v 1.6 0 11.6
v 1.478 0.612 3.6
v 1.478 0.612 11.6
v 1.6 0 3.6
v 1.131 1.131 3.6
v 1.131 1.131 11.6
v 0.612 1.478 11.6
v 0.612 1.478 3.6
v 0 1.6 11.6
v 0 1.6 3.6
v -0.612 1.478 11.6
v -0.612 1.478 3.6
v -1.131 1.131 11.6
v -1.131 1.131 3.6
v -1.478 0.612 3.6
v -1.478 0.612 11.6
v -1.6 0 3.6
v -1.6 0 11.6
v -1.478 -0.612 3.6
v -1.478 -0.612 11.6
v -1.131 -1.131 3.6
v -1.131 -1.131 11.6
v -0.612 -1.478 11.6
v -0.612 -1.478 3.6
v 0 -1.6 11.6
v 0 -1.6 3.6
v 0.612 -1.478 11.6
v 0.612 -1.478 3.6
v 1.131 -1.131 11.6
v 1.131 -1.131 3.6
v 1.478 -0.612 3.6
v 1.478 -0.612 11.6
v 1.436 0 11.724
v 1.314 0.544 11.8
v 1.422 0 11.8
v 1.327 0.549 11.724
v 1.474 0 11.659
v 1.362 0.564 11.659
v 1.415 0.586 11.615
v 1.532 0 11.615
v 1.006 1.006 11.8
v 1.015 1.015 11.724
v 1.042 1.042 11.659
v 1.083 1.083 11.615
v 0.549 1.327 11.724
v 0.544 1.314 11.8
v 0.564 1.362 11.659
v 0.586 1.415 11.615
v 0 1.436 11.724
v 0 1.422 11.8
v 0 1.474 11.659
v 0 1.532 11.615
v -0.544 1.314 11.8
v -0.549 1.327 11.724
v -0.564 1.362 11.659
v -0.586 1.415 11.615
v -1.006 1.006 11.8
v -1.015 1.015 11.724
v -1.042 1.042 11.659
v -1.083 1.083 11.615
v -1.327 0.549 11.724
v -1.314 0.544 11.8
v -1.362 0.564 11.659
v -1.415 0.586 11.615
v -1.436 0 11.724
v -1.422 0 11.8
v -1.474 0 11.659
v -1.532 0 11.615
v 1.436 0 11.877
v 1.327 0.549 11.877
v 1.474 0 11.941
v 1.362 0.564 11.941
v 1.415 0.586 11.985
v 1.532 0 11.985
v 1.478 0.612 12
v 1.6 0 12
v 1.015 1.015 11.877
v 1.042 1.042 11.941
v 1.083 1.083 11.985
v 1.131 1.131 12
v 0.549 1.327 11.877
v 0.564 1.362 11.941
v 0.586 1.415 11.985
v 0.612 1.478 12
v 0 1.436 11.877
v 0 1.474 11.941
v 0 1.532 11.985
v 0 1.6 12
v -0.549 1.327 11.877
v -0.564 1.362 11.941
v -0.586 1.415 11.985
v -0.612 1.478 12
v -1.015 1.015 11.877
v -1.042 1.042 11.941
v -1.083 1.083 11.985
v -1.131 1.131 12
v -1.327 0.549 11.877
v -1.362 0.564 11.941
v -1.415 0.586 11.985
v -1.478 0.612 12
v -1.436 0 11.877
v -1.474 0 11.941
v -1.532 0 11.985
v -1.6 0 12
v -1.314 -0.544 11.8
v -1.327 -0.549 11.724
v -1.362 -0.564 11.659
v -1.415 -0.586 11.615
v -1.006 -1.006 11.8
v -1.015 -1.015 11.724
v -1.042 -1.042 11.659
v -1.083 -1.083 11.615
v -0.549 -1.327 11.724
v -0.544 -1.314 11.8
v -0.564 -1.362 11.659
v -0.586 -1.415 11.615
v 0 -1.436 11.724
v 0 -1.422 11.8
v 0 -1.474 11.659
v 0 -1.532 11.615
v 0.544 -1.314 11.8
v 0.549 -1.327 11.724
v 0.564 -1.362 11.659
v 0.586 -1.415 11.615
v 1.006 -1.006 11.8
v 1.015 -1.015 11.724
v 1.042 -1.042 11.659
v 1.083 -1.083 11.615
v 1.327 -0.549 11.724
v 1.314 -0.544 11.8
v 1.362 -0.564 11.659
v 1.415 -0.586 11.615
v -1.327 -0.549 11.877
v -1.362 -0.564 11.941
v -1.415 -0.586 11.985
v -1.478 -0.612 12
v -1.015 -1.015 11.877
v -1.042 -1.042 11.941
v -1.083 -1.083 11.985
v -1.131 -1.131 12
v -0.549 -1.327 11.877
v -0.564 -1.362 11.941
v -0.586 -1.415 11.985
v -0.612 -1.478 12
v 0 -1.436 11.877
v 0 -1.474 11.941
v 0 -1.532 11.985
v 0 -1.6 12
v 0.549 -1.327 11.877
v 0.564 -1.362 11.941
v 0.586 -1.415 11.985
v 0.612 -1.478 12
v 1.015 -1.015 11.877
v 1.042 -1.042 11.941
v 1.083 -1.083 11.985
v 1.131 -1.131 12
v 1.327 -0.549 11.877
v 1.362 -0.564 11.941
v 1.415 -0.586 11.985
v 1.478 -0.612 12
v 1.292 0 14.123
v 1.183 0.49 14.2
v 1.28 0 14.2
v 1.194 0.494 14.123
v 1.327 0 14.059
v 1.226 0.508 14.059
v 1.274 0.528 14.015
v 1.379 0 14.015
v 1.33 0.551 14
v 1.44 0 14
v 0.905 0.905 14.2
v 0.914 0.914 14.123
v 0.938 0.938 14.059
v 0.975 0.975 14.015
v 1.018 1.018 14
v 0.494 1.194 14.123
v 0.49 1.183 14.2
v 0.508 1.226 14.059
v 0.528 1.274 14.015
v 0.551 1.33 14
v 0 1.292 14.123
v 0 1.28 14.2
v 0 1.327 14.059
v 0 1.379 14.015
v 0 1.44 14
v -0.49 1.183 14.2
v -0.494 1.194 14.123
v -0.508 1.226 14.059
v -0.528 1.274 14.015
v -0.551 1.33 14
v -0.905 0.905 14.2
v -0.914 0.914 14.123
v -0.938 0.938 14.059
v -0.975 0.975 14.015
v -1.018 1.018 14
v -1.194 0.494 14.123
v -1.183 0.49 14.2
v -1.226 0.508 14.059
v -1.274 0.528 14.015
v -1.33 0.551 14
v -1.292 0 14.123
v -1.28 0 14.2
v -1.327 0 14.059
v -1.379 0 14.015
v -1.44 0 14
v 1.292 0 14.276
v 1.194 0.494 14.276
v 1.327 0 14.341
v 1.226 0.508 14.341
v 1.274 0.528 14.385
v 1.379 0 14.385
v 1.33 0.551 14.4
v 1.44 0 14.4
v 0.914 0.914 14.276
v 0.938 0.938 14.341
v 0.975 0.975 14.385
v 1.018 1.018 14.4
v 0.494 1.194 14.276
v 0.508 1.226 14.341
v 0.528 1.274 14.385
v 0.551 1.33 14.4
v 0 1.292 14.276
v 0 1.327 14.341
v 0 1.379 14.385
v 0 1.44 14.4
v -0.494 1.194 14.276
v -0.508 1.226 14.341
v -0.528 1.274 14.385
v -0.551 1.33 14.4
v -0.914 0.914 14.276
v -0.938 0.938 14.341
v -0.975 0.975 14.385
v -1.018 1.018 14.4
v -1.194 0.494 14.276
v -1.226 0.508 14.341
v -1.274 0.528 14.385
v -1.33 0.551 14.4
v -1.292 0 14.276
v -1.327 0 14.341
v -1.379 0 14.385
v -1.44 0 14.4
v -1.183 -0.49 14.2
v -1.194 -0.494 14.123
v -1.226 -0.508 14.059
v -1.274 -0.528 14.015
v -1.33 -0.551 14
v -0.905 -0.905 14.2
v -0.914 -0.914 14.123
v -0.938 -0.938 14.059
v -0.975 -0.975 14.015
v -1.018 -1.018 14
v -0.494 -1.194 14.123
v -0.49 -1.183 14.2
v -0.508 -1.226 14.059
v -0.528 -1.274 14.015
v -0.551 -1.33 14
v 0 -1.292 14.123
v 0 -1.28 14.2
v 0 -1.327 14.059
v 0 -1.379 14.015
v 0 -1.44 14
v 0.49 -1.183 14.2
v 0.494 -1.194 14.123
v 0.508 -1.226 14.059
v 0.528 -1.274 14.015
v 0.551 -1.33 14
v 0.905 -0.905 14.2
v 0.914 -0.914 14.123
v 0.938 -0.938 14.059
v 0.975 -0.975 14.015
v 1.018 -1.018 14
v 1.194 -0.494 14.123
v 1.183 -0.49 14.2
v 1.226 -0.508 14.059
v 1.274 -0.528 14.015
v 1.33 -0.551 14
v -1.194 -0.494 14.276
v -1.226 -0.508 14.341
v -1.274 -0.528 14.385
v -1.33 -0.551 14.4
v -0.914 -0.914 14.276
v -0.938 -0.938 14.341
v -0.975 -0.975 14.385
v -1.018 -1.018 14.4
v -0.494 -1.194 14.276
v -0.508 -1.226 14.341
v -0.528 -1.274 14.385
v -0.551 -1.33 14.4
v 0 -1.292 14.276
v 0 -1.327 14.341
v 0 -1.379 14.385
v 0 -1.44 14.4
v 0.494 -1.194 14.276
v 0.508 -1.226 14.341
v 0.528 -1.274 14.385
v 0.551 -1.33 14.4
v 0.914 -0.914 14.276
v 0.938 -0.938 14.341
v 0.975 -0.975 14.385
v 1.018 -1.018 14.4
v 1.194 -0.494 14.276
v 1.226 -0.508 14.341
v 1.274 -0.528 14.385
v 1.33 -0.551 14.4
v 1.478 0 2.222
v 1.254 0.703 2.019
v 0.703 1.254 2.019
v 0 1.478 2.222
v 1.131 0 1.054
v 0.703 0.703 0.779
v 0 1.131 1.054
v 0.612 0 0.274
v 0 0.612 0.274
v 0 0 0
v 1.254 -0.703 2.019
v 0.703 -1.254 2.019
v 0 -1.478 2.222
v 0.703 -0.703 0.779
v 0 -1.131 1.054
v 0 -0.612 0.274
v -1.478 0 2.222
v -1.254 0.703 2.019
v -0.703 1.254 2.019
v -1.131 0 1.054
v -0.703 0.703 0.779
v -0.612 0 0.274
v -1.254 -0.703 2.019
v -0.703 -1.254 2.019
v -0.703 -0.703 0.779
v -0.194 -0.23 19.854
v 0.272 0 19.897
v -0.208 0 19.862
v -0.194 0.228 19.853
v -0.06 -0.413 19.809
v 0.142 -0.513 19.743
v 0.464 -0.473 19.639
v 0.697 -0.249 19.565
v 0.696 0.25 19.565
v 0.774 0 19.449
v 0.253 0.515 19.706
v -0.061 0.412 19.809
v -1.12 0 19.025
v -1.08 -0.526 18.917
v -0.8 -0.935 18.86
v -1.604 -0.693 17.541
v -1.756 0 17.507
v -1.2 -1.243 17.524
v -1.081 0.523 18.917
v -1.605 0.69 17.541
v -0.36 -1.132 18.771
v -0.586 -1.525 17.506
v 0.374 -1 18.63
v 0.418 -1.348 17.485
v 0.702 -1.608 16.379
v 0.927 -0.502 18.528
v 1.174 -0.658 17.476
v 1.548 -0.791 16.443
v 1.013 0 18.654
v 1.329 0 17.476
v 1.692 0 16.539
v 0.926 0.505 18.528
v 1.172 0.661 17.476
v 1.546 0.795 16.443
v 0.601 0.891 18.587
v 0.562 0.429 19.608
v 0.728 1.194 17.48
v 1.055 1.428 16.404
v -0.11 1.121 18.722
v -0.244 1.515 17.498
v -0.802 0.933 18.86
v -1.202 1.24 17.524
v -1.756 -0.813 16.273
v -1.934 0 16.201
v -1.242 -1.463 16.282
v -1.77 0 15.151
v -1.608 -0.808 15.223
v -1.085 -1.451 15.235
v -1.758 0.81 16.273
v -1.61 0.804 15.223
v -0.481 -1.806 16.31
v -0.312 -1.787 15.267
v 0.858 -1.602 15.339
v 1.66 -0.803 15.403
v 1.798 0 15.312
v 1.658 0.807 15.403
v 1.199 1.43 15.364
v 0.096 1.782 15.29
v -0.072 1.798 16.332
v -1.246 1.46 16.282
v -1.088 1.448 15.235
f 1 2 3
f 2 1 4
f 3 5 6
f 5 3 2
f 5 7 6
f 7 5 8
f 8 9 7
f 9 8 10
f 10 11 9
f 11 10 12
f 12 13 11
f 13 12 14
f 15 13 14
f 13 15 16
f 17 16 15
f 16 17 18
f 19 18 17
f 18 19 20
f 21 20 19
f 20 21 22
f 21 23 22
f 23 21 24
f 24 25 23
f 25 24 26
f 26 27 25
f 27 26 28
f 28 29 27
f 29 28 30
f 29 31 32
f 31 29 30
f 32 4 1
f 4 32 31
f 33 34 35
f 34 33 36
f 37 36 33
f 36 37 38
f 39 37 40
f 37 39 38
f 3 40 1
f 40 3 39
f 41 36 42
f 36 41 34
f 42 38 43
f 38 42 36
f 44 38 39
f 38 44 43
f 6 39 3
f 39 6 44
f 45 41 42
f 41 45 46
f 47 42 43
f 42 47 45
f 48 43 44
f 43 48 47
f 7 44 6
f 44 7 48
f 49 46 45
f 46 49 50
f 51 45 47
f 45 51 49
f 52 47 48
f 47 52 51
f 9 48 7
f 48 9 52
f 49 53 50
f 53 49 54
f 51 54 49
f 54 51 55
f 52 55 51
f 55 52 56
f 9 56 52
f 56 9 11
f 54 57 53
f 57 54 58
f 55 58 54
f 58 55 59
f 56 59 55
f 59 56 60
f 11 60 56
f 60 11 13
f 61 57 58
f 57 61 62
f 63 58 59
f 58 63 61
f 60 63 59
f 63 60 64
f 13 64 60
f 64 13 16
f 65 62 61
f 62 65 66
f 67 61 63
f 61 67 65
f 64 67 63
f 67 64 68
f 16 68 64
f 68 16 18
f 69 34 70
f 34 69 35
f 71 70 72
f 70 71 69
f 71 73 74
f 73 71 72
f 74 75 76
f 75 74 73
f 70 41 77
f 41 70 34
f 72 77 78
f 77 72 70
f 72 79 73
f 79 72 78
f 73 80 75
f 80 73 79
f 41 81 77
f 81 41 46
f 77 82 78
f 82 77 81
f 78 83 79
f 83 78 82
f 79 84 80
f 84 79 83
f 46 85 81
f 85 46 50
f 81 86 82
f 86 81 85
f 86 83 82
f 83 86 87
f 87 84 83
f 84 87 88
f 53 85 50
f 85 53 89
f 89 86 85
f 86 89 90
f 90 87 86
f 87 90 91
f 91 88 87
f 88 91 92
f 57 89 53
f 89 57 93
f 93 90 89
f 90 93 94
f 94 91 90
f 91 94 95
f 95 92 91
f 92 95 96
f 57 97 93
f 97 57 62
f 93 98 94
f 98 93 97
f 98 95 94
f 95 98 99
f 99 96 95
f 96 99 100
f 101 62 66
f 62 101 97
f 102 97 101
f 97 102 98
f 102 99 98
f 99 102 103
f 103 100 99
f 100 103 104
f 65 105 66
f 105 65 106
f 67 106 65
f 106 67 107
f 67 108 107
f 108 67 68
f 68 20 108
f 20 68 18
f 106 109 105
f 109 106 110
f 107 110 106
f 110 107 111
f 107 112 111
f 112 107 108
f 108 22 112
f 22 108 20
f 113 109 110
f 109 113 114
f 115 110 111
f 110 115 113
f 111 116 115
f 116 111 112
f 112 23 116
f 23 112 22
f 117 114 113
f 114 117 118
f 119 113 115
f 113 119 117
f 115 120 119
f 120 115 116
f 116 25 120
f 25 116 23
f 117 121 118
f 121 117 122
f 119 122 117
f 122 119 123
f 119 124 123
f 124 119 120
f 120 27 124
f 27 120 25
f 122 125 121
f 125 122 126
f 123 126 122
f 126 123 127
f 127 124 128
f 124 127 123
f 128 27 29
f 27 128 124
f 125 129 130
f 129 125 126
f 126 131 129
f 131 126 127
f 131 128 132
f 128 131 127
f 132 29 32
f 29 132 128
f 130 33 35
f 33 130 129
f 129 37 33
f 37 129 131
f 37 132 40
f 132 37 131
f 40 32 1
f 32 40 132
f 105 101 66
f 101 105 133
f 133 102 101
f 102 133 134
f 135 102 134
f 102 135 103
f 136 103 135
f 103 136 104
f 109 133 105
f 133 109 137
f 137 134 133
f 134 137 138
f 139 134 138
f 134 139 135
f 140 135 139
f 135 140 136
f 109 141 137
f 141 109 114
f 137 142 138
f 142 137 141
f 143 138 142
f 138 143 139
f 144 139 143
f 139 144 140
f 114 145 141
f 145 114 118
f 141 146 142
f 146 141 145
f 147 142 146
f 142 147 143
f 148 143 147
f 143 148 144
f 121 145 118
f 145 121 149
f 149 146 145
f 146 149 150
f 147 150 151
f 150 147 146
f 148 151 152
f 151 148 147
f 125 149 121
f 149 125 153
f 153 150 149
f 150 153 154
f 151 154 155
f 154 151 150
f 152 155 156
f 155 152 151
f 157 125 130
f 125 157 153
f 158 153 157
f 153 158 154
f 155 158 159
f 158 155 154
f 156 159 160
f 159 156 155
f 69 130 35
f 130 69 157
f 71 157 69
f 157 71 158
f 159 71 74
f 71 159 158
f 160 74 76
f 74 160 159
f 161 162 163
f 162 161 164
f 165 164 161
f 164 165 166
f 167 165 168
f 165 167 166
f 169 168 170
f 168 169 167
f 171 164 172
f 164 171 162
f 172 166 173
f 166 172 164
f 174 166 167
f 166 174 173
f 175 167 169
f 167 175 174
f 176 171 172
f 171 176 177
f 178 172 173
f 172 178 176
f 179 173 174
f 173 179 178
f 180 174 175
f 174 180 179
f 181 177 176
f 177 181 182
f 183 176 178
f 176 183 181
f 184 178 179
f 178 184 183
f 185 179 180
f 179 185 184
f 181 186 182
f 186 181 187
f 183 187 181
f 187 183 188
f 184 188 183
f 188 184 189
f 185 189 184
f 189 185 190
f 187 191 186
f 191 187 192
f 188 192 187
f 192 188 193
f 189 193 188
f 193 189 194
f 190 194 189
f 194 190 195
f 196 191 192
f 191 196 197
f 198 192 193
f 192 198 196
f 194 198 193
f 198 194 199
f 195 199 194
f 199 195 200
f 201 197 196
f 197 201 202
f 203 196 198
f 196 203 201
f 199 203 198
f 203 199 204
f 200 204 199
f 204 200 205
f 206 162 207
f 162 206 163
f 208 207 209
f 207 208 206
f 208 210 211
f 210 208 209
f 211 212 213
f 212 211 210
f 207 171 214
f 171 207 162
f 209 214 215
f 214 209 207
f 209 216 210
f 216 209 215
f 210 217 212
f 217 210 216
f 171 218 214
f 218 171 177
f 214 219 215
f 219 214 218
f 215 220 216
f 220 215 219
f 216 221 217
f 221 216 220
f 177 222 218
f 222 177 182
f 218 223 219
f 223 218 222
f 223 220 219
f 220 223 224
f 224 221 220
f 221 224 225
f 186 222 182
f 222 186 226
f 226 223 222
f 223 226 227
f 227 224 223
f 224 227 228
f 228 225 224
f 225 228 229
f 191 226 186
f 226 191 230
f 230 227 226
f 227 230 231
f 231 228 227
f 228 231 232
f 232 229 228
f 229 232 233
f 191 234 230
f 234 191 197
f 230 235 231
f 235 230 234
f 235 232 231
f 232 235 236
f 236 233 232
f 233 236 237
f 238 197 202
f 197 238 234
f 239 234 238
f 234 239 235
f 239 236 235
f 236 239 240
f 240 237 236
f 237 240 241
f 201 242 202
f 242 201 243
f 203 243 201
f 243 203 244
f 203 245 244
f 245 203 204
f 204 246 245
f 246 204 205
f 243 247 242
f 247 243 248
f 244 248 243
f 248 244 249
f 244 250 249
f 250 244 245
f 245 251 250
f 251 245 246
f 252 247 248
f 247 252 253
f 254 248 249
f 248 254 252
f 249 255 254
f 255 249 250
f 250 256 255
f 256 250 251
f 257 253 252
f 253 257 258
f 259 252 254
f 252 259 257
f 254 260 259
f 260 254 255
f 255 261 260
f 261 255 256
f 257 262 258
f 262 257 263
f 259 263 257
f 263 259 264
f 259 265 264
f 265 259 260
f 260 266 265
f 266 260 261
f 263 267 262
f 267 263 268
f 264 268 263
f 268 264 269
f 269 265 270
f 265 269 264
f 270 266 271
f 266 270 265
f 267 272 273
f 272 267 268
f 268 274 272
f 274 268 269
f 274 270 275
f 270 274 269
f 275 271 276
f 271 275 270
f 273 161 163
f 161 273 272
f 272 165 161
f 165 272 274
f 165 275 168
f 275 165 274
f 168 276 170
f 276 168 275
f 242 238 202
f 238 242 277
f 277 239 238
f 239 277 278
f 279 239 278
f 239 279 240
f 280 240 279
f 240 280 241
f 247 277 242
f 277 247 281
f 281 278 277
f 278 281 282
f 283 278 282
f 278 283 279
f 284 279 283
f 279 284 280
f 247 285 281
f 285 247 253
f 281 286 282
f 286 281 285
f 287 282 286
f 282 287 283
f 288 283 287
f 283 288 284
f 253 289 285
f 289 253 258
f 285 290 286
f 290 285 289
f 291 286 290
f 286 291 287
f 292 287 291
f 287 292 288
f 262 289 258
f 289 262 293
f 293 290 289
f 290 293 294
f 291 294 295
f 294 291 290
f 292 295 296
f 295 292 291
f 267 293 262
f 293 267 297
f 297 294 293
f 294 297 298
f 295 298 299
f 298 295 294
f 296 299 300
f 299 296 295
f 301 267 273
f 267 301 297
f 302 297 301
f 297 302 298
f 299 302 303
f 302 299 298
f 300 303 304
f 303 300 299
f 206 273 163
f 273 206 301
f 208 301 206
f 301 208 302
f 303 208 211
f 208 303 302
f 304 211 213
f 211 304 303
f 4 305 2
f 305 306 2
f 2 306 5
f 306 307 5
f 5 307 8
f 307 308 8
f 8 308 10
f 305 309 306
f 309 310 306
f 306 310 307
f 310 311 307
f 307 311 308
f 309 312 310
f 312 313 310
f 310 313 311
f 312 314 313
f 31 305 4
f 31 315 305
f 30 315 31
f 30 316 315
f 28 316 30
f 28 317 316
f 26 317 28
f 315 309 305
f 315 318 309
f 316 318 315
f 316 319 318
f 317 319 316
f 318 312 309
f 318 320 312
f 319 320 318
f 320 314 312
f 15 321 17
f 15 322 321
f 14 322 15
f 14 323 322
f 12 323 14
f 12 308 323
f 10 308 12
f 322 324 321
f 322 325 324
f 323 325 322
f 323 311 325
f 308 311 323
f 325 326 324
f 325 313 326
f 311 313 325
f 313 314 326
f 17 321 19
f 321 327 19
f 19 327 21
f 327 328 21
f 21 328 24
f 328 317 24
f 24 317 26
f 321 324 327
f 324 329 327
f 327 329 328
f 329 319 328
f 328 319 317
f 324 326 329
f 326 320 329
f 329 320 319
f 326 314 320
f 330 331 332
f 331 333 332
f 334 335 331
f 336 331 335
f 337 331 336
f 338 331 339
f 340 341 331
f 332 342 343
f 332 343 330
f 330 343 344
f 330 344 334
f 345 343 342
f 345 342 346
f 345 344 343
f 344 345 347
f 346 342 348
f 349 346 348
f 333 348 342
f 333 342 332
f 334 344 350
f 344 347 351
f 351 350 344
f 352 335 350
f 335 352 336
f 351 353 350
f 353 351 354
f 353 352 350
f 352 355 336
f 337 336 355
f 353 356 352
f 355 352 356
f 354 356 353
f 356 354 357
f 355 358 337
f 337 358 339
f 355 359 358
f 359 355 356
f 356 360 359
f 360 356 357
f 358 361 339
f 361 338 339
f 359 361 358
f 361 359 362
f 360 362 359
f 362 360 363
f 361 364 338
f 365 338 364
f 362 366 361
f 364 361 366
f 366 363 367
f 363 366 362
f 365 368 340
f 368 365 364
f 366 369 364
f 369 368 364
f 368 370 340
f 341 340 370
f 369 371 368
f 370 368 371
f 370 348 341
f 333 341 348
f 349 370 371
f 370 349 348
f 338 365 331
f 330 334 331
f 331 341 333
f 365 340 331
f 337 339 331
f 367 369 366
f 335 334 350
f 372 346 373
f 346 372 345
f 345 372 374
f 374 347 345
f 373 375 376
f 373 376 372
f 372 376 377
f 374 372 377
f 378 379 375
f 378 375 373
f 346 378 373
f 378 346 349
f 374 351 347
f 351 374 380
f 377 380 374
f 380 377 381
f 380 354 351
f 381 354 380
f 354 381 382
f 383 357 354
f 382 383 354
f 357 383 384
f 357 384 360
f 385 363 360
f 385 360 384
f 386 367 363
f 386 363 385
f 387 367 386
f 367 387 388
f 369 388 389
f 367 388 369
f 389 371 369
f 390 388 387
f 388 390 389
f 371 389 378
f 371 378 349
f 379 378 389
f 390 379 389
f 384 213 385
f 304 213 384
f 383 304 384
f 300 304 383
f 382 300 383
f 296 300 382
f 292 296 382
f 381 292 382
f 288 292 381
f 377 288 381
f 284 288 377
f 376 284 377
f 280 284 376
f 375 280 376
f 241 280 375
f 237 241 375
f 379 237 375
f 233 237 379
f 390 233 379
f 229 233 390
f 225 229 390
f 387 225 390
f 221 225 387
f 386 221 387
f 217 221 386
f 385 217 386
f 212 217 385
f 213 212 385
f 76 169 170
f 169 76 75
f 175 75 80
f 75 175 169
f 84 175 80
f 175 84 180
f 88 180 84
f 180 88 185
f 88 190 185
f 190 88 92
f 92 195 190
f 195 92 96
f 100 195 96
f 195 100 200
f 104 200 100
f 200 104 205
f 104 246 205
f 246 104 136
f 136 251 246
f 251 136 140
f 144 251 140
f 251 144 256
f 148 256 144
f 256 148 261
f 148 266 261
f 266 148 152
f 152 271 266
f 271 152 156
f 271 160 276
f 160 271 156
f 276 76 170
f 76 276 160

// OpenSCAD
use <../lib.scad>
use <../p/4-4con9.scad>
use <s/93552s01.scad>
use <s/93552s02.scad>
use <s/93552s03.scad>
function ldraw_lib__93552p03() = [
// 0 Minifig Paint Brush with Half Orange Tip Pattern
// 0 Name: 93552p03.dat
// 0 Author: Vincent Messenet [Cheenzo]
// 0 !LDRAW_ORG Part UPDATE 2024-04
// 0 !LICENSE Licensed under CC BY 4.0 : see CAreadme.txt
// 
// 0 BFC CERTIFY CCW
  [0,"BFC","CERTIFY"],
  [0,"BFC","CCW"],
// 
// 0 !CATEGORY Minifig Accessory
// 0 !KEYWORDS BrickLink 93552pb03, Brickowl 367337, Rebrickable 93552pr0003
// 0 !KEYWORDS Set 40380, Set 60234, Set 71741
// 
// 0 !HISTORY 2020-09-05 [PTadmin] Official Update 2020-02
// 0 !HISTORY 2022-12-12 [Cheenzo] Updated to use 93552s03 and updated description and keywords
// 0 !HISTORY 2024-05-28 [OrionP] Official Update 2024-04
// 
// 
// 1 16 0 0 0 1 0 0 0 1 0 0 0 1 s\93552s01.dat
  [1,16,0,0,0,1,0,0,0,1,0,0,0,1, ldraw_lib__s__93552s01()],
// 1 25 0 0 0 1 0 0 0 1 0 0 0 1 s\93552s02.dat
  [1,25,0,0,0,1,0,0,0,1,0,0,0,1, ldraw_lib__s__93552s02()],
// 1 16 0 0 0 1 0 0 0 1 0 0 0 1 s\93552s03.dat
  [1,16,0,0,0,1,0,0,0,1,0,0,0,1, ldraw_lib__s__93552s03()],
// 1 16 0 -30 0 0.4 0 0 0 -5 0 0 0 0.4 4-4con9.dat
  [1,16,0,-30,0,0.4,0,0,0,-5,0,0,0,0.4, ldraw_lib__4_4con9()],
];
module ldraw_lib__93552p03(step=0, col=false, unit=2/5, alt=false, line=0.2, solid=!$preview)
    makepoly(ldraw_lib__93552p03(), step=step, col=col, unit=unit, alt=alt, line=line, solid=solid);
ldraw_lib__93552p03(line=0.2);
